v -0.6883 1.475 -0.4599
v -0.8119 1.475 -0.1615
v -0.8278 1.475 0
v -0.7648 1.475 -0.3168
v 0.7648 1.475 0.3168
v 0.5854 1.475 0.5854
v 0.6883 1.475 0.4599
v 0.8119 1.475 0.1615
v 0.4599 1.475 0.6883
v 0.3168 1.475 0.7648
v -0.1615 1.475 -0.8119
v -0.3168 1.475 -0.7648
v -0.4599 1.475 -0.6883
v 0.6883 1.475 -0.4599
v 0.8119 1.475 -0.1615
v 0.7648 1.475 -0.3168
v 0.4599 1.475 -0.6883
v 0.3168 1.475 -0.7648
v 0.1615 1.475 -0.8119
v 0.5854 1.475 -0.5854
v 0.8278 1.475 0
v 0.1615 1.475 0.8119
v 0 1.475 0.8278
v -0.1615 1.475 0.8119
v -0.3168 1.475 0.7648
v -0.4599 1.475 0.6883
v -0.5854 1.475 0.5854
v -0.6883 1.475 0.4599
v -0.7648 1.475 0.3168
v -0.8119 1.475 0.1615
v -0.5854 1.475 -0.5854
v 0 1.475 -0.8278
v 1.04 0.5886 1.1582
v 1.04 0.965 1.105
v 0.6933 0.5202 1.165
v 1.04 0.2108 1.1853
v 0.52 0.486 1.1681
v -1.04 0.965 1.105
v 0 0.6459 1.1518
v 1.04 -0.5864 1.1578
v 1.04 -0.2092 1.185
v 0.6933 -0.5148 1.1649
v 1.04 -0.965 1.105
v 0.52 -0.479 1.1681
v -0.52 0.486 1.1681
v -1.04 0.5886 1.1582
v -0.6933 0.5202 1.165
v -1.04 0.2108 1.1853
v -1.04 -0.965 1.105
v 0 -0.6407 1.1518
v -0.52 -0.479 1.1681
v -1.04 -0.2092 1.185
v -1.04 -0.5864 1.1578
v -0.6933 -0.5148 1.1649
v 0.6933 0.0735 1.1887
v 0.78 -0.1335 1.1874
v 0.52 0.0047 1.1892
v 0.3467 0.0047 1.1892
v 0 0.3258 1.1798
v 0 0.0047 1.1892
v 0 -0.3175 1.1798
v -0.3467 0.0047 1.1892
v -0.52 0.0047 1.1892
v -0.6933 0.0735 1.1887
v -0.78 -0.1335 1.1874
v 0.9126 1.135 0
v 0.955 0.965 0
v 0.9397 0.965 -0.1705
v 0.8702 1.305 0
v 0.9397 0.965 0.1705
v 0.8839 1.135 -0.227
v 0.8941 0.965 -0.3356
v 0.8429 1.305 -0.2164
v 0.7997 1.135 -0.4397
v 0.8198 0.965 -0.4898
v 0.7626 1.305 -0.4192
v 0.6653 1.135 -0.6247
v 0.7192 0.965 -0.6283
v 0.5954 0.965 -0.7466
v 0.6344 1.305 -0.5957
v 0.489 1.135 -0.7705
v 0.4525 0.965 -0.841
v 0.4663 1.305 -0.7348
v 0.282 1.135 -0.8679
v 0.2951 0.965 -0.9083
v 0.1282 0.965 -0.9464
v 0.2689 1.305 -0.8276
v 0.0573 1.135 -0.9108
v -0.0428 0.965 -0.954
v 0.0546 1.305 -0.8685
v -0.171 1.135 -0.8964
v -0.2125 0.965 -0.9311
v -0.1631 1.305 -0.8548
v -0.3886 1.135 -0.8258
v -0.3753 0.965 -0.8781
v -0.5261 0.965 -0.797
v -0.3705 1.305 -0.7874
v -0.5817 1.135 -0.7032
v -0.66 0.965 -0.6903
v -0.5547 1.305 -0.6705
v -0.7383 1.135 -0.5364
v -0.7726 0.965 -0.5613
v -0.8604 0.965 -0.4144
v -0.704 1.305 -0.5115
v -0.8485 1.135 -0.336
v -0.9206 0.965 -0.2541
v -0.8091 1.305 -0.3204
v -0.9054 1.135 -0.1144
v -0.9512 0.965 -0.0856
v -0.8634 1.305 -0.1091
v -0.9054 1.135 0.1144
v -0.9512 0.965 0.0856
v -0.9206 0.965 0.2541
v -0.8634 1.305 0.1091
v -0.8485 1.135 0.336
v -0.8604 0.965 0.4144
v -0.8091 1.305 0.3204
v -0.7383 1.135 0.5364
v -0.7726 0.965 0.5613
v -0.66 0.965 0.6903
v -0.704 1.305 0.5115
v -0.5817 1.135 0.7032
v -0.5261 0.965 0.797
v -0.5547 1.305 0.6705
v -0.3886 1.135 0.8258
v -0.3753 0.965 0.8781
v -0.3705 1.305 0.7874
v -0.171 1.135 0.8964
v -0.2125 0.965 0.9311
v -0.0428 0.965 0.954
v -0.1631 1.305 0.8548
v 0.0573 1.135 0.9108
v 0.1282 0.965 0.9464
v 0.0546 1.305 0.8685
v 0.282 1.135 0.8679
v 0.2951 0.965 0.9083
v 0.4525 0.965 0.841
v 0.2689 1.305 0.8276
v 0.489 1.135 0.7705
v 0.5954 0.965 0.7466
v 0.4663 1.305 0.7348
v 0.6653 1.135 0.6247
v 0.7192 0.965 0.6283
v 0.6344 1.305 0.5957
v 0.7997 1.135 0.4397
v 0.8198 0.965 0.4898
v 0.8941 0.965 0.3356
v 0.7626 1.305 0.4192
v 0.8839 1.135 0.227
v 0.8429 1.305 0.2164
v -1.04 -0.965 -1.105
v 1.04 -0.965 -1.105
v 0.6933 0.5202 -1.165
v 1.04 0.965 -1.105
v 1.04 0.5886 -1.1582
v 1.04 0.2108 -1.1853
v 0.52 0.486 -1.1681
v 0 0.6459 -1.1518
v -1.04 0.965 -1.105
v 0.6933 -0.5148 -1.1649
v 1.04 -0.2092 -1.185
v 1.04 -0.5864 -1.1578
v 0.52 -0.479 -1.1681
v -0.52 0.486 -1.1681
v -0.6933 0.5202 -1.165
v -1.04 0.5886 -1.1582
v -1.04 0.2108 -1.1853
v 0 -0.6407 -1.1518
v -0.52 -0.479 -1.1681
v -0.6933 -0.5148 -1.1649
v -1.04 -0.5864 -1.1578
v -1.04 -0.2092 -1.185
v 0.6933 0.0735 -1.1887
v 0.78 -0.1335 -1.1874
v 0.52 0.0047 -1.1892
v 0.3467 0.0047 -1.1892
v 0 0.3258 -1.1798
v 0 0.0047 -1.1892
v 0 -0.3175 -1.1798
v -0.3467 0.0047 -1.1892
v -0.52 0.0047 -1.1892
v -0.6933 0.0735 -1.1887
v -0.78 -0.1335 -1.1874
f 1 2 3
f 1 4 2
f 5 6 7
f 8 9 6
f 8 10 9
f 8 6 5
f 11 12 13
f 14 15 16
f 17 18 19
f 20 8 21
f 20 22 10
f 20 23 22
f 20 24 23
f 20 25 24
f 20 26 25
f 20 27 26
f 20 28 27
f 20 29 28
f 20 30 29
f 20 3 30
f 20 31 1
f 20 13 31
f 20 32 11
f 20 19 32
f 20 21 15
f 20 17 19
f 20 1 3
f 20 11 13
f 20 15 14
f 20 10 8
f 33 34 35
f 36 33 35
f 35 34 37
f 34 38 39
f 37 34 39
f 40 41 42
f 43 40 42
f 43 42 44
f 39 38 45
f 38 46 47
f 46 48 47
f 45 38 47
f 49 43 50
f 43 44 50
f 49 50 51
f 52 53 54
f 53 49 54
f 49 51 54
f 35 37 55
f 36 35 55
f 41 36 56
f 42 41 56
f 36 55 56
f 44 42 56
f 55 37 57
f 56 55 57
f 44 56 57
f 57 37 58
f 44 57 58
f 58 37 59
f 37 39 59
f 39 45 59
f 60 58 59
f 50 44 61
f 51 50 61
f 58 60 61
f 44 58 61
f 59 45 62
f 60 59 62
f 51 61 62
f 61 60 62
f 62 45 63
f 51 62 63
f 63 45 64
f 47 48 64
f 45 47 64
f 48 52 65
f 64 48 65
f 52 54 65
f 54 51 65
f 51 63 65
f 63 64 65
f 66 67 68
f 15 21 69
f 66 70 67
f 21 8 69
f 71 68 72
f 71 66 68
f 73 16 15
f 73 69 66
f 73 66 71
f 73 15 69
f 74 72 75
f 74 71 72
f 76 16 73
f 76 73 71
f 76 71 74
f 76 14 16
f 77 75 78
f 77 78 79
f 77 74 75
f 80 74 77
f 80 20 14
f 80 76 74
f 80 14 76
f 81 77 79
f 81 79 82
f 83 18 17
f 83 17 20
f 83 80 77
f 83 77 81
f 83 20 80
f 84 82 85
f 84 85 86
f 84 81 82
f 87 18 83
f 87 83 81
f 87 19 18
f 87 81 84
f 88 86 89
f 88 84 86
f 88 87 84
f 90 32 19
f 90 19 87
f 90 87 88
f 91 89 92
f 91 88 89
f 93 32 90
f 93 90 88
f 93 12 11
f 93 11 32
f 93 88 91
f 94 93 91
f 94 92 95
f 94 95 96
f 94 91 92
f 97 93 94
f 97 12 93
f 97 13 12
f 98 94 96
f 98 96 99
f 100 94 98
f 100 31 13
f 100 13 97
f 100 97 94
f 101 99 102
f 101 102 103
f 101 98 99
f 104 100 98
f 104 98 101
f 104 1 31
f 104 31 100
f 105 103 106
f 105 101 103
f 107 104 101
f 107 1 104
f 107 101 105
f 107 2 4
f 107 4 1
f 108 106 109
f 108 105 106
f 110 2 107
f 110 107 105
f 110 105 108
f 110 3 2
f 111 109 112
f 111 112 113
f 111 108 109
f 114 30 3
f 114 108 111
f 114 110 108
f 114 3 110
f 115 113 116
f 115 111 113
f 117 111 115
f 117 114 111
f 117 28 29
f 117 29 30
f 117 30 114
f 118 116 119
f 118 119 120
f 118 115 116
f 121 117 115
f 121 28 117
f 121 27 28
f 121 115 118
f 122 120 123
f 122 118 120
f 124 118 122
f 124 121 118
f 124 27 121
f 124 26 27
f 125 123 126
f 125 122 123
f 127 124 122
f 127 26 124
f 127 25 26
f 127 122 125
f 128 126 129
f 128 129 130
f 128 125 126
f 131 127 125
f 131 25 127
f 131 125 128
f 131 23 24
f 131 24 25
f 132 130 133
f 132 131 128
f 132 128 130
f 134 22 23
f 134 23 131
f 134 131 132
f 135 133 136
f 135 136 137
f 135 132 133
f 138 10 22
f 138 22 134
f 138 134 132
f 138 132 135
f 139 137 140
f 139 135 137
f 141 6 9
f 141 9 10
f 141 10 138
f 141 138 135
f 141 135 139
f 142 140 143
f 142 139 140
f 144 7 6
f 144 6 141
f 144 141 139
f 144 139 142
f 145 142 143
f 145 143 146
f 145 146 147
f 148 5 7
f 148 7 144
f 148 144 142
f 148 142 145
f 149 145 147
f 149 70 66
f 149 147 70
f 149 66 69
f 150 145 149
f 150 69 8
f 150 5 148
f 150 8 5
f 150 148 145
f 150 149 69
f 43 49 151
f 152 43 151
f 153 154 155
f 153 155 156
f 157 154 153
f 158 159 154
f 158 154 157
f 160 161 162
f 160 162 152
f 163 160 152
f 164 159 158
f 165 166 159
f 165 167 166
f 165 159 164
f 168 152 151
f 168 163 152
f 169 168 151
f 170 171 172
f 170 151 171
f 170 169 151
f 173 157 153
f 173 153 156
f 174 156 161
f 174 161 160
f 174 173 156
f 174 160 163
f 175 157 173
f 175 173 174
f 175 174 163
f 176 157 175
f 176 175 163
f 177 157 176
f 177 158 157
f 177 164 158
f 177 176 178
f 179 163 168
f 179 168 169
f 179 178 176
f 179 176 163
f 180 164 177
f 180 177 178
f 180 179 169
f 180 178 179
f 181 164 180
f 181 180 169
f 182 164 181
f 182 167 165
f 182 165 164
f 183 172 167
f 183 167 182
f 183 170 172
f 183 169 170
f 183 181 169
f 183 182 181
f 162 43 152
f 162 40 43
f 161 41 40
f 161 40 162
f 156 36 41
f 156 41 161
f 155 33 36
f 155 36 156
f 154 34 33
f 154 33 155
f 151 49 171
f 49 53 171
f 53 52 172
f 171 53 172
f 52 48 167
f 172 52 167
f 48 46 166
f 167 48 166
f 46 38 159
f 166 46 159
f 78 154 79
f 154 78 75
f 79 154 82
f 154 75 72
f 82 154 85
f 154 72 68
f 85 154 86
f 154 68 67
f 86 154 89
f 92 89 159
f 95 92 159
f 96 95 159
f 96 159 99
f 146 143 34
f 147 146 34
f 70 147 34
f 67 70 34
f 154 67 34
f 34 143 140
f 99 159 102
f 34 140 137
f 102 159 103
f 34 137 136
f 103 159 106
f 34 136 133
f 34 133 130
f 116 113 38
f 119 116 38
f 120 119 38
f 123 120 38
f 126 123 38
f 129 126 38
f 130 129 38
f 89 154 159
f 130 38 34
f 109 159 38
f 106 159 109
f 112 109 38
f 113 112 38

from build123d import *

# Parameters (mm, degrees)
BOSS_EXTRUDE1_DEPTH      = 1.04
BOSS_EXTRUDE1_DEPTH_BACK = 1.04
SKETCH2_R                = 0.955
BOSS_EXTRUDE2_DEPTH      = 0.51
BOSS_EXTRUDE2_TAPER      = 14


with BuildPart() as part:
    # Sketch1 → Boss-Extrude1 (new, two sides: drawn at the far end of the back side and taken through both)
    with BuildSketch(Plane(origin=(0, 0, 0), x_dir=(0, 0, -1), z_dir=(1, 0, 0)).offset(-BOSS_EXTRUDE1_DEPTH_BACK)):
        with BuildLine():
            Line((-1.105, -0.965), (1.105, -0.965))
            add(Edge.make_bspline(
                [(1.105, 0.965), (1.273333661, 0.009409903), (1.105, -0.965)],
                knots=[0, 0, 0, 1, 1, 1], degree=2))
            Line((1.105, 0.965), (-1.105, 0.965))
            add(Edge.make_bspline(
                [(-1.105, 0.965), (-1.273333661, 0.009409903), (-1.105, -0.965)],
                knots=[0, 0, 0, 1, 1, 1], degree=2))
        make_face()
    extrude(amount=BOSS_EXTRUDE1_DEPTH + BOSS_EXTRUDE1_DEPTH_BACK)

    # Sketch2 → Boss-Extrude2 (add)
    with BuildSketch(Plane(origin=(0, 0.965, 0), x_dir=(1, 0, 0), z_dir=(0, 1, 0))):
        Circle(SKETCH2_R)
    extrude(amount=BOSS_EXTRUDE2_DEPTH, taper=BOSS_EXTRUDE2_TAPER)


solid = part.part
